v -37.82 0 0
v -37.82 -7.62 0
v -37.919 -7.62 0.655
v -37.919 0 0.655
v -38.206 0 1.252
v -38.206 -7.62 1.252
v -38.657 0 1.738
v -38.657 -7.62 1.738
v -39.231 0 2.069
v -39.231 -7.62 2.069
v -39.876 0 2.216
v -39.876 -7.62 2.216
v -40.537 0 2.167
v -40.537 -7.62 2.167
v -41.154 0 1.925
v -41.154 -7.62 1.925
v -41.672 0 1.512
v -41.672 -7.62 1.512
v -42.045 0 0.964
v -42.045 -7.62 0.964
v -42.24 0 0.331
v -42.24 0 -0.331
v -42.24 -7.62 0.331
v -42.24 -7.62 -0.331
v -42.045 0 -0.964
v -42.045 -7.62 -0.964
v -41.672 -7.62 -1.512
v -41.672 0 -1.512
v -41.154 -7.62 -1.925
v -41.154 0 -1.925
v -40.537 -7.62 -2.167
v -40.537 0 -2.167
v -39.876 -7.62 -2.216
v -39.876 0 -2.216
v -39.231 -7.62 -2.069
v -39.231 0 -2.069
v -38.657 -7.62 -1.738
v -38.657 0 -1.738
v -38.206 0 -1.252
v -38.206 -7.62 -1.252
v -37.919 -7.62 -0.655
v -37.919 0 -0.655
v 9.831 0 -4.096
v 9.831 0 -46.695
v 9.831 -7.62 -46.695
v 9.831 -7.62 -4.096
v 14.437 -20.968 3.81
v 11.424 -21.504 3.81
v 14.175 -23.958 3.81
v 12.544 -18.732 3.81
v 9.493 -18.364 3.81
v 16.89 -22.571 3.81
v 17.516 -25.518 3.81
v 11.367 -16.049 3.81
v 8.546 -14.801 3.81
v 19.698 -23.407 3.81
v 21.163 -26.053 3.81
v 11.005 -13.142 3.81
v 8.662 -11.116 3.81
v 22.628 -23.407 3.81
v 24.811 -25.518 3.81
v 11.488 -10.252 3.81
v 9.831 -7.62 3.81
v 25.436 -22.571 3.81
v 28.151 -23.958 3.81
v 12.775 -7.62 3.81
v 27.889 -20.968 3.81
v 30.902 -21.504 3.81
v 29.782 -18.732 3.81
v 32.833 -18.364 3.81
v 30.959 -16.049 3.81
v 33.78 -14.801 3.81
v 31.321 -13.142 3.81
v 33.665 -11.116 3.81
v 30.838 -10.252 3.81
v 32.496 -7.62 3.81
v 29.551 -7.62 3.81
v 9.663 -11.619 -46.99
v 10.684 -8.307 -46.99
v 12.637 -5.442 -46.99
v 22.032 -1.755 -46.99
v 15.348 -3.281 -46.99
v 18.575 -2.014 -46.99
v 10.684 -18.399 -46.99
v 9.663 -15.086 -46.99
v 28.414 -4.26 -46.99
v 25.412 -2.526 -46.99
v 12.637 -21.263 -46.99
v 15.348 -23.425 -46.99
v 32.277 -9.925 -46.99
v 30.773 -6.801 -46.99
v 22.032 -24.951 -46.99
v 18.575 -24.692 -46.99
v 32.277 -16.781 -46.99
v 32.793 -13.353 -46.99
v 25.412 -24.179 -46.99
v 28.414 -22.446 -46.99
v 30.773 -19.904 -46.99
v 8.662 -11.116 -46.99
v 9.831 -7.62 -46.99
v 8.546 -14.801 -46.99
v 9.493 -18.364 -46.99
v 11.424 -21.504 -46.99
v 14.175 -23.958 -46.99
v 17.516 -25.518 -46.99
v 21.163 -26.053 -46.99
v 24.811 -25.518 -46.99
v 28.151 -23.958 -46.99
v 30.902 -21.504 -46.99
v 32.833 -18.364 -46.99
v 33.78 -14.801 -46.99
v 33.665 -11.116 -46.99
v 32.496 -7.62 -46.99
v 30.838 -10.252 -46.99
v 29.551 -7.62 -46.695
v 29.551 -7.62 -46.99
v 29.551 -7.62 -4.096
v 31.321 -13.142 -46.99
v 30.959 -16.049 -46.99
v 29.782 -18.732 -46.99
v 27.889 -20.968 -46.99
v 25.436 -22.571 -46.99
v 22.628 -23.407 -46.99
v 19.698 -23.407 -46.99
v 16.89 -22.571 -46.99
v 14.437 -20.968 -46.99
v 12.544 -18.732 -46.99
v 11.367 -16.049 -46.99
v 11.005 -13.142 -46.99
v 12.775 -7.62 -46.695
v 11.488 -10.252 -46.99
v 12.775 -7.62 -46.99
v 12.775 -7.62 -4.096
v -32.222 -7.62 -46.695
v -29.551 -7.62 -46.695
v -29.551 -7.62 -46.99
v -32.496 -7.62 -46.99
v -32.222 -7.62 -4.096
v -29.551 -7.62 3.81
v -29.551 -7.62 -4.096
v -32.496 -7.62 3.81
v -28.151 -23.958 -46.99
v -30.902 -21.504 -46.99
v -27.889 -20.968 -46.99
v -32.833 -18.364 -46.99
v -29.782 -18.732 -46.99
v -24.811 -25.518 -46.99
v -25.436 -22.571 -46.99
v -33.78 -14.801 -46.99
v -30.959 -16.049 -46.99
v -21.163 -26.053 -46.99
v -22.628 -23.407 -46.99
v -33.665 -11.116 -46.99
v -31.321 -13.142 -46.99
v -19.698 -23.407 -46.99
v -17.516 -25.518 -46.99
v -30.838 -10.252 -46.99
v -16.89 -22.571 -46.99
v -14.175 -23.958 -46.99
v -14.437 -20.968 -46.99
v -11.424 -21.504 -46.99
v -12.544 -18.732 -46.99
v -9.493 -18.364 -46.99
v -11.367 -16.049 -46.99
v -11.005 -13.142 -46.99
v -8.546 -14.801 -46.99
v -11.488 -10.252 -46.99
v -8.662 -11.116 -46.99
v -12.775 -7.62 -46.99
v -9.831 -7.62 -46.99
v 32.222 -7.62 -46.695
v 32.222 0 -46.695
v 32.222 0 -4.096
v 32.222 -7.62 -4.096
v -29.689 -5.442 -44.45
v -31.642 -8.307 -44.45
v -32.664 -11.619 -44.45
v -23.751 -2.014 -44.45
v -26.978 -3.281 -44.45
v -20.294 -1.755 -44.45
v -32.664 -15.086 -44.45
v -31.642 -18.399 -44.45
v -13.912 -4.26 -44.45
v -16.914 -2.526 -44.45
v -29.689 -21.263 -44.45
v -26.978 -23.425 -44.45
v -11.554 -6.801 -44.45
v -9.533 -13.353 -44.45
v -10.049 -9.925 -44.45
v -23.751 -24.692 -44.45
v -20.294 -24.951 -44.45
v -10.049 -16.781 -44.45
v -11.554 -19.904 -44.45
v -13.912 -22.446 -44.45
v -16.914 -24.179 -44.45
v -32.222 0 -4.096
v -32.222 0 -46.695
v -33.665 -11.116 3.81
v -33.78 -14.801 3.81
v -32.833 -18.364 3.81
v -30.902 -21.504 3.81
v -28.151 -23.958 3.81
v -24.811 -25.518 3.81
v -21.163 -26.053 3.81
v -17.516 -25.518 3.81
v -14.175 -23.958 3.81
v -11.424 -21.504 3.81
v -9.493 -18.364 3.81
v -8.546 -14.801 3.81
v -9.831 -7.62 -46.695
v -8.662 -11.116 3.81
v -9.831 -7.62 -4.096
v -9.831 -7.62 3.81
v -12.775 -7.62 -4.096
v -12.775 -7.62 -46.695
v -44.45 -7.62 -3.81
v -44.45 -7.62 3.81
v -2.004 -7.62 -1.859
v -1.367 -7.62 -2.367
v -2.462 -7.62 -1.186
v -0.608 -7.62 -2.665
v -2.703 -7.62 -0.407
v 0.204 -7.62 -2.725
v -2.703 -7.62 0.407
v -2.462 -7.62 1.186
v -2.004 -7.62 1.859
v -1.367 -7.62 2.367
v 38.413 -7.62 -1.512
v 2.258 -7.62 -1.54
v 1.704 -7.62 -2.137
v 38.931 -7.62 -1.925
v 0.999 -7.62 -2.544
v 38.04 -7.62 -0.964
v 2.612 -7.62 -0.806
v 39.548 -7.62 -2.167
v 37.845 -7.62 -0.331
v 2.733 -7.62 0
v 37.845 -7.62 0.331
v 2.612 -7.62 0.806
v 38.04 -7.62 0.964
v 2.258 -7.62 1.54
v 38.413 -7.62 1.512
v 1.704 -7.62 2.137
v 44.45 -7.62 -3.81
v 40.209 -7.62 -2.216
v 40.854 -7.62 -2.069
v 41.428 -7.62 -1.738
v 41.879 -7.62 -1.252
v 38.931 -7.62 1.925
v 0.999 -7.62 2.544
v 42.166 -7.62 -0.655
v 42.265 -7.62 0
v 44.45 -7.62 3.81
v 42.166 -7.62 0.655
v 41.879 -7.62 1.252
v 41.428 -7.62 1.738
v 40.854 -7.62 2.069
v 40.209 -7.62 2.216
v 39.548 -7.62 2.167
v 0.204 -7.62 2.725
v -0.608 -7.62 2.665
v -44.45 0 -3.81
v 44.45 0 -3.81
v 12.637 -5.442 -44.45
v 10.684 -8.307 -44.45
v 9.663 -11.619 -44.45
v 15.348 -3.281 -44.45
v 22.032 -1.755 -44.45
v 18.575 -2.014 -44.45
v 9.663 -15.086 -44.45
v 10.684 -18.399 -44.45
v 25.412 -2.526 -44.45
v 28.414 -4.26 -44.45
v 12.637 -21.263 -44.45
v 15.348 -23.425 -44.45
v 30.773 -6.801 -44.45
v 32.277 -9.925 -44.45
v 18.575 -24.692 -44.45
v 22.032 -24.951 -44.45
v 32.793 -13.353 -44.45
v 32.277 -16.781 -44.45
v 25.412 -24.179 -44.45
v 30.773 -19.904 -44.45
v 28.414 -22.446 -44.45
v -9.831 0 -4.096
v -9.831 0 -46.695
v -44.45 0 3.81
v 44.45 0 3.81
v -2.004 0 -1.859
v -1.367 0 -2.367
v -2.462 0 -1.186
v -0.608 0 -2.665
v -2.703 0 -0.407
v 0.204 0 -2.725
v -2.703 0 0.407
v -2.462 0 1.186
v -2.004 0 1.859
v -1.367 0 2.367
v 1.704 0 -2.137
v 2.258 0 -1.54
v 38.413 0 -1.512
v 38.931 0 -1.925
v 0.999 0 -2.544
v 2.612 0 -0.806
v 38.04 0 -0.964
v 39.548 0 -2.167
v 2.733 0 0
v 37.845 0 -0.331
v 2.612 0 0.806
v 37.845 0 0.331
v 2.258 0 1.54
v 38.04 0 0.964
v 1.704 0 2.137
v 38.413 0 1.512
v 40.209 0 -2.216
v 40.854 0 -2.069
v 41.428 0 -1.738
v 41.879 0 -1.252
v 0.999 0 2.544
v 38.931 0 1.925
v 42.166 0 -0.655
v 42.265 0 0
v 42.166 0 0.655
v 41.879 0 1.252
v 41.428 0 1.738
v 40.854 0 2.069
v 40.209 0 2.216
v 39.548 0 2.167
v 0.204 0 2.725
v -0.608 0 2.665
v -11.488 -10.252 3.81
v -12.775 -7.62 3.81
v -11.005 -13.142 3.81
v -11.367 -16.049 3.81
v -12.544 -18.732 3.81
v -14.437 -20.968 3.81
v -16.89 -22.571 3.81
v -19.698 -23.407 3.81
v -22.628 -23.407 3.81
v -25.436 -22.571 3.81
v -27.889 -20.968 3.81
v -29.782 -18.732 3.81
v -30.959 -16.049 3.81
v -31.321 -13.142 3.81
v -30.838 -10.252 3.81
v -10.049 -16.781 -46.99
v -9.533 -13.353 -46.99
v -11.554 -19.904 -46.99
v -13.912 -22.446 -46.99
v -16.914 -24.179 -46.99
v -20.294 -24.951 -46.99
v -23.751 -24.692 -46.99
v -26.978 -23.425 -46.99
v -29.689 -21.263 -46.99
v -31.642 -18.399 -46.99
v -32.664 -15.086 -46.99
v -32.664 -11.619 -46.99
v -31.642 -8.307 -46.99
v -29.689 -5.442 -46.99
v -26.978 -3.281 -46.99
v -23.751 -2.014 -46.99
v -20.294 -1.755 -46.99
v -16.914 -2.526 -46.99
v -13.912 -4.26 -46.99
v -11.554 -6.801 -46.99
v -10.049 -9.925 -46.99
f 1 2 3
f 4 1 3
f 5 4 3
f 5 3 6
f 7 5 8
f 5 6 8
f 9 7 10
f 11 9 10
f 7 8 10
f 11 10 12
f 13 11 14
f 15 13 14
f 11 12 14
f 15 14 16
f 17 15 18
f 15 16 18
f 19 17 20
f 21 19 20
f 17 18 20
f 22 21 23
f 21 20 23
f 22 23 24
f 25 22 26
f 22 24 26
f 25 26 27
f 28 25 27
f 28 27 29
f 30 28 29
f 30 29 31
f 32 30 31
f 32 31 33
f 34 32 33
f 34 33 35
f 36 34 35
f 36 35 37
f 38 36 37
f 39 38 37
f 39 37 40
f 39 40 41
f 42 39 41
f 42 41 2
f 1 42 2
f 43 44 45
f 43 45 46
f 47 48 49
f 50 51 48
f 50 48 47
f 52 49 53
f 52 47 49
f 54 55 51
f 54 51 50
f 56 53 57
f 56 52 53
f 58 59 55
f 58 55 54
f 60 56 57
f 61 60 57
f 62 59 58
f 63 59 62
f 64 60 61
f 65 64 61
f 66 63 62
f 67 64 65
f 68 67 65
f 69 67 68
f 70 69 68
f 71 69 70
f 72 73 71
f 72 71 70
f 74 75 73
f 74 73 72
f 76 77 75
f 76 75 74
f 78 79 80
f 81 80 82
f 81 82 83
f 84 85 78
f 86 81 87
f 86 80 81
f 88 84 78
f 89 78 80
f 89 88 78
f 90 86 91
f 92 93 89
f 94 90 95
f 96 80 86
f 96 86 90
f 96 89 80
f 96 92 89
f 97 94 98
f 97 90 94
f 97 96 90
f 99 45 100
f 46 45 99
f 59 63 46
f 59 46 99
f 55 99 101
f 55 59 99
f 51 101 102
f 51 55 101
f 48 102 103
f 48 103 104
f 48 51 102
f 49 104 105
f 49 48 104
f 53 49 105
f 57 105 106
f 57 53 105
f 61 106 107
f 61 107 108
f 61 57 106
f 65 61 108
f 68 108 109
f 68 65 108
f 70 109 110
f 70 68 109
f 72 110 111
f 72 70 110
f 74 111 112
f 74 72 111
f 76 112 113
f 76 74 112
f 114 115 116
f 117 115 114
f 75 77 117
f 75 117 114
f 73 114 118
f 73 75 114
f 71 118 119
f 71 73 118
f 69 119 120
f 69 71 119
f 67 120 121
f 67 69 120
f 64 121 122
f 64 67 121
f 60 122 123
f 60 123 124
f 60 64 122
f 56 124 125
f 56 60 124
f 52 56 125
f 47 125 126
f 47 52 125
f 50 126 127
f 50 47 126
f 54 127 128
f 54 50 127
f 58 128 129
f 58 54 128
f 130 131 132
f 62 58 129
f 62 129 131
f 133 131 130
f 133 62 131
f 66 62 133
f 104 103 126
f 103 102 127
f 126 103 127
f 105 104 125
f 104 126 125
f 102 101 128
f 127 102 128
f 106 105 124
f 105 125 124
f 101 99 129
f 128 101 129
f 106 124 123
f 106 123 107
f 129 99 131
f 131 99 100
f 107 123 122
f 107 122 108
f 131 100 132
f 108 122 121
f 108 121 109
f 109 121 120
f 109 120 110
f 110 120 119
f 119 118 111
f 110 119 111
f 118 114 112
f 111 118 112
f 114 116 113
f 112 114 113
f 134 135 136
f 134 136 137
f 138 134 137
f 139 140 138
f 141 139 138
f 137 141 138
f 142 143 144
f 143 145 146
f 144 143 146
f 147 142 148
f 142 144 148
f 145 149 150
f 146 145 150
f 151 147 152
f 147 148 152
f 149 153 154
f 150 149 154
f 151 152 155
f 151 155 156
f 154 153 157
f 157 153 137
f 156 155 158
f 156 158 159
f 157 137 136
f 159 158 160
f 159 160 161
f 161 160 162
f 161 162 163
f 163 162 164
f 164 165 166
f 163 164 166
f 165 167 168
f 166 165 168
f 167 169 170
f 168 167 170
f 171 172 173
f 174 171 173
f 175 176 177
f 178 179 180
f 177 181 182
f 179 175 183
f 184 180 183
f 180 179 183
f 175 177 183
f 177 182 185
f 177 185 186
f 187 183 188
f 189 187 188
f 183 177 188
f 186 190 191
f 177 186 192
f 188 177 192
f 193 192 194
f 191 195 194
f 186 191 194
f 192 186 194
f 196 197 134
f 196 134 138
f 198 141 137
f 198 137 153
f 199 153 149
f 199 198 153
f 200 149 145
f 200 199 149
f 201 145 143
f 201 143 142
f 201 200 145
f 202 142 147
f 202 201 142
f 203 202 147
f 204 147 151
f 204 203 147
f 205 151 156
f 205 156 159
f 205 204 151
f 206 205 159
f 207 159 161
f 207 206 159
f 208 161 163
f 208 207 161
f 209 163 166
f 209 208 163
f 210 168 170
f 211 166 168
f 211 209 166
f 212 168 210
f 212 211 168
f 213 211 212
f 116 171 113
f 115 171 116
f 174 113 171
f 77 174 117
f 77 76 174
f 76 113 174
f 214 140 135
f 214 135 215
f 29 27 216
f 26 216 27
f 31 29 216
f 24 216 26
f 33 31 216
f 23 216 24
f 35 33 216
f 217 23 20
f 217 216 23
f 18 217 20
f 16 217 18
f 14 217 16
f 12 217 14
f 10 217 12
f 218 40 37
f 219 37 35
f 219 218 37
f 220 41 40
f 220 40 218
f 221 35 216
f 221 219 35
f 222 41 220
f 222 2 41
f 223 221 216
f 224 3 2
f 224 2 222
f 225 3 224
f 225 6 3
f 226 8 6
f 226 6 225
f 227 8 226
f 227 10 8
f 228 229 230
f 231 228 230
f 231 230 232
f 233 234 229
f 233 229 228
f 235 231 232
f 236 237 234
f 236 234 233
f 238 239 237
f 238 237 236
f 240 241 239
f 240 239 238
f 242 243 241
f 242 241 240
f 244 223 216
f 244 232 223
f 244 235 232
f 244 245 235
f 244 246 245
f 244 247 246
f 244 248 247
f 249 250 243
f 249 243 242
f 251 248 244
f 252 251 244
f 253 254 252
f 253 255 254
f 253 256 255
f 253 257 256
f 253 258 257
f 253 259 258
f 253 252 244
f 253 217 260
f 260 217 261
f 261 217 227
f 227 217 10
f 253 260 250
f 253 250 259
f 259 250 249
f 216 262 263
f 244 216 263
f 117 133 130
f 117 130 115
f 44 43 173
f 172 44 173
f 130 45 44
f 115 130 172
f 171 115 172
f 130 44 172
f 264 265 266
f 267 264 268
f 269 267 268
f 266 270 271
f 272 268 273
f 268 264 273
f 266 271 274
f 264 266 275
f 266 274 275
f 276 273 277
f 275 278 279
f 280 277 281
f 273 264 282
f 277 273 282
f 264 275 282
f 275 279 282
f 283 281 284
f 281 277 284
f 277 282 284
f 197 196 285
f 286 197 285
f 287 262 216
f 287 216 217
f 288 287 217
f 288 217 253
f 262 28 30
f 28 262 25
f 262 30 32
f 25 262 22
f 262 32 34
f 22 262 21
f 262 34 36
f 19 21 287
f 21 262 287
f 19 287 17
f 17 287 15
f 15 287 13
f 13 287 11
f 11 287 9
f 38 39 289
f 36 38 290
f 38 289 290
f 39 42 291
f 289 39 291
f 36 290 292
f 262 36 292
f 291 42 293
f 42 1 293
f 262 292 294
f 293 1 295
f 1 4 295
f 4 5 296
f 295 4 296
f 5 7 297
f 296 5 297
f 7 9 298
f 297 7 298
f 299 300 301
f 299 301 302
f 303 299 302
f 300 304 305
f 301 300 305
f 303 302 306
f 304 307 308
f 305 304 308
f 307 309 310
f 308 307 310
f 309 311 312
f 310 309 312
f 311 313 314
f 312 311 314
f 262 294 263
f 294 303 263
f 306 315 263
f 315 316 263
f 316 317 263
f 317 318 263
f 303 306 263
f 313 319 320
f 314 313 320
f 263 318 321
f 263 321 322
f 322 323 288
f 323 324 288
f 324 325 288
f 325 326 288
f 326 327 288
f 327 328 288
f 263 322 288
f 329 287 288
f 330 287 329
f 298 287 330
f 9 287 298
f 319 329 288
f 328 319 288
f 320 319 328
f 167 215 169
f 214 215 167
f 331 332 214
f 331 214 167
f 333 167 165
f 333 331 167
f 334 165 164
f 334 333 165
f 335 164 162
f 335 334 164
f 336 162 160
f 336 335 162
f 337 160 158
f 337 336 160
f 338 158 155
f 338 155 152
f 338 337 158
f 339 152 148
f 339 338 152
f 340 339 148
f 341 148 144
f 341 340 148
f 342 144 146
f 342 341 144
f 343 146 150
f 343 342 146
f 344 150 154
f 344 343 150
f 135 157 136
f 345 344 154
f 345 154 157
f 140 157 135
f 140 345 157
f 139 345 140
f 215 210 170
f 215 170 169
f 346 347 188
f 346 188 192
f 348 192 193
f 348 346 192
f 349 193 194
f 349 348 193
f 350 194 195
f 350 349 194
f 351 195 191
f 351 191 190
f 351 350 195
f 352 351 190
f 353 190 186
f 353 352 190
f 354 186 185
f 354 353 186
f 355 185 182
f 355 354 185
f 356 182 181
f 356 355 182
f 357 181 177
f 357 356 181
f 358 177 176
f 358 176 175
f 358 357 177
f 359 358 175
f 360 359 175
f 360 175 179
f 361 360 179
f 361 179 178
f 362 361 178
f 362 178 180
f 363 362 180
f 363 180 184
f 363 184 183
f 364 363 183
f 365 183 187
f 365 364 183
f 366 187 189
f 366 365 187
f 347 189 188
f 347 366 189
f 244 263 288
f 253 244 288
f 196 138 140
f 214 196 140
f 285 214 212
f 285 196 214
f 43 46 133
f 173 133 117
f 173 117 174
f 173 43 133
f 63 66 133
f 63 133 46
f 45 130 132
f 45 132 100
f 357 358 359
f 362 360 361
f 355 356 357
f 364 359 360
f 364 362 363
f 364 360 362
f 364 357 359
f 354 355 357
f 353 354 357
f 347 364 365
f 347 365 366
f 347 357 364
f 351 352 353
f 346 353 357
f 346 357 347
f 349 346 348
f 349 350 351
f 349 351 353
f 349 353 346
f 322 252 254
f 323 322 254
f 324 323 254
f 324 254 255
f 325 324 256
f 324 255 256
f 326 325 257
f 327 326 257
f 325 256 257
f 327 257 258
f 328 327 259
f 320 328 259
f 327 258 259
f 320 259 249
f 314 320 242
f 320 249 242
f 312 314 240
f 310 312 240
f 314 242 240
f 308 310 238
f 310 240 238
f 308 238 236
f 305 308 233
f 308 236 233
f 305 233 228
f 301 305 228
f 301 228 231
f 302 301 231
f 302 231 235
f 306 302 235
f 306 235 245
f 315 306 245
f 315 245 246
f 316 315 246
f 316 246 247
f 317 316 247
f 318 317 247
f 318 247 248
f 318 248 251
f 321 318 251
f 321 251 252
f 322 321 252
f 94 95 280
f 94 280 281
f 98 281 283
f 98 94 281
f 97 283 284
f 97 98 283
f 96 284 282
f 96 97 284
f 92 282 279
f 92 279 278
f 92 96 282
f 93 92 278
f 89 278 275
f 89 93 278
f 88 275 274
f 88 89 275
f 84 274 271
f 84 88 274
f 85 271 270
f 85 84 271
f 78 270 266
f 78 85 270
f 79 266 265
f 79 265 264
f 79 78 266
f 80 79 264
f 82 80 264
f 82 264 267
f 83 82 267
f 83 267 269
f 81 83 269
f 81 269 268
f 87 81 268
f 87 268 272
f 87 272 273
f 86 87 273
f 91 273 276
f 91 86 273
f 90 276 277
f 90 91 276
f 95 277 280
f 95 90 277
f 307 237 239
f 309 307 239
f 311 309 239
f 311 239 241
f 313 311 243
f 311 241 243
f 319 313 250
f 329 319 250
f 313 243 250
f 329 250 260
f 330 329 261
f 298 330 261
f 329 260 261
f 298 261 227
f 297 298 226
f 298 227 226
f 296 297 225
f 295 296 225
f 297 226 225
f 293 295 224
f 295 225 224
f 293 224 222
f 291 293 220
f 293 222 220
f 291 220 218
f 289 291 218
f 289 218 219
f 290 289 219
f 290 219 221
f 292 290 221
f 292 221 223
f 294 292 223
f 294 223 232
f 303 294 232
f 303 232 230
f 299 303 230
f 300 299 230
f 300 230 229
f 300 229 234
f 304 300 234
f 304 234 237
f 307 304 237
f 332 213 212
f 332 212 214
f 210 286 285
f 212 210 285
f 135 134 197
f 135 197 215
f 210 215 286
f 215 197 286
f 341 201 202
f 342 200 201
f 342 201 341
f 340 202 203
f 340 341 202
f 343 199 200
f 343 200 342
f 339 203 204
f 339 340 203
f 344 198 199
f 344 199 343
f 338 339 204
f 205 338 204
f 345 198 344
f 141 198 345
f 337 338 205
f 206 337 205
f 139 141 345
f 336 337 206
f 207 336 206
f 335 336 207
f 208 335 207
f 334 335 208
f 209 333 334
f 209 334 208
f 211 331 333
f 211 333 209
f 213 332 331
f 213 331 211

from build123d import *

# Parameters (mm, degrees)
F0_W      = 88.9
F0_H      = 7.62
F1_DEPTH  = 7.62
F3_DEPTH  = 50.8
F4_W      = 22.391876
F4_H      = 42.59918
F5_DEPTH  = 7.62
F6_R      = 11.630376
F7_DEPTH  = 2.54
F8_R      = 2.2225
F9_DEPTH  = 7.621
F10_R     = 2.733138
F11_DEPTH = 25.4


with BuildPart() as f1:
    # F0 (on Front) → F1 (new body)
    with BuildSketch(Plane.XZ):
        Rectangle(F0_W, F0_H)
    extrude(amount=F1_DEPTH)

    # F8 (on face) → F9 (cut, through all)
    with BuildSketch(Plane.XZ.offset(7.62)):
        with Locations((-40.042471, 0)):
            Circle(F8_R)
        with Locations((40.042471, 0)):
            Circle(F8_R)
    extrude(amount=-F9_DEPTH, mode=Mode.SUBTRACT)

    # F10 (on face) → F11 (cut)
    with BuildSketch(Plane.XZ.offset(7.62)):
        Circle(F10_R)
    extrude(amount=-F11_DEPTH, mode=Mode.SUBTRACT)


with BuildPart() as f3:
    # F2 (on face) → F3 (new body)
    with BuildSketch(Plane.XY.offset(3.81)):
        with BuildLine():
            Line((-29.551175, -7.62), (-32.495528, -7.62))
            ThreePointArc((-32.495528, -7.62), (-21.163055, -26.052804), (-9.830581, -7.62))
            Line((-9.830581, -7.62), (-12.774935, -7.62))
            ThreePointArc((-12.774935, -7.62), (-21.163055, -23.512804), (-29.551175, -7.62))
        make_face()
        with BuildLine():
            Line((12.774935, -7.62), (9.830581, -7.62))
            ThreePointArc((9.830581, -7.62), (21.163055, -26.052804), (32.495528, -7.62))
            Line((32.495528, -7.62), (29.551175, -7.62))
            ThreePointArc((29.551175, -7.62), (21.163055, -23.512804), (12.774935, -7.62))
        make_face()
    extrude(amount=-F3_DEPTH)

    # F4 (on Front) → F5 (join)
    with BuildSketch(Plane.XZ):
        with Locations((-21.026519, -25.395665)):
            Rectangle(F4_W, F4_H)
        with Locations((21.026519, -25.395665)):
            Rectangle(F4_W, F4_H)
    extrude(amount=F5_DEPTH)


with BuildPart() as f7:
    # F6 (on face) → F7 (new body)
    with BuildSketch(Plane(origin=(0, 0, -46.99), x_dir=(1, 0, 0), z_dir=(0, 0, -1))):
        with Locations((21.163055, 13.352804)):
            Circle(F6_R)
        with Locations((-21.163055, 13.352804)):
            Circle(F6_R)
    extrude(amount=-F7_DEPTH)


solid = Compound([f1.part, f3.part, f7.part])
